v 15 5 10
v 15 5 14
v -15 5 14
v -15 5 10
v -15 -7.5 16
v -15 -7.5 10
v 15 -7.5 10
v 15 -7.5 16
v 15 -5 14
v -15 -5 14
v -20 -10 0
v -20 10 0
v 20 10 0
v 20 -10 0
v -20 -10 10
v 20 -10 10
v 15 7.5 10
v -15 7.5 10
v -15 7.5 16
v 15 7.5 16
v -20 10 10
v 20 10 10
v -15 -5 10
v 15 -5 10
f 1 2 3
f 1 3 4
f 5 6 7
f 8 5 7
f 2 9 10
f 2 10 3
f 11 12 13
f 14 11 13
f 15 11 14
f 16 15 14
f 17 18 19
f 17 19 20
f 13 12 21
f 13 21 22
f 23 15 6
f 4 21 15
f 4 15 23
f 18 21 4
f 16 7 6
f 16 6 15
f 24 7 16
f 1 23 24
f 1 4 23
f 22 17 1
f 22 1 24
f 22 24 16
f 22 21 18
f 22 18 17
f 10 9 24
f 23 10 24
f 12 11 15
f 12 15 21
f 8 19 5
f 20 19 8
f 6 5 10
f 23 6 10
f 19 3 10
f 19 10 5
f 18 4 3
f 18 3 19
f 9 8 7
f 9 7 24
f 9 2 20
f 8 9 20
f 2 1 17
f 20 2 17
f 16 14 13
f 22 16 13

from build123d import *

# Parameters (mm, degrees)
SKETCH_1_W          = 40
SKETCH_1_H          = 20
EXTRUDE_1_DEPTH     = 10
SKETCH_2_W          = 30
SKETCH_2_H          = 15
EXTRUDE_2_DEPTH     = 6
SKETCH_3_W          = 4
SKETCH_3_H          = 10
CUT_EXTRUDE_1_DEPTH = 40


with BuildPart() as part:
    # 草图1 → 凸台-拉伸1 (new body)
    with BuildSketch(Plane.XY):
        Rectangle(SKETCH_1_W, SKETCH_1_H)
    extrude(amount=EXTRUDE_1_DEPTH)

    # 草图2 → 凸台-拉伸2 (add)
    with BuildSketch(Plane.XY.offset(10)):
        Rectangle(SKETCH_2_W, SKETCH_2_H)
    extrude(amount=EXTRUDE_2_DEPTH)

    # 草图3 → 切除-拉伸1 (cut)
    with BuildSketch(Plane(origin=(15, 0, 0), x_dir=(0, 0, -1), z_dir=(1, 0, 0))):
        with Locations((-12, 0)):
            Rectangle(SKETCH_3_W, SKETCH_3_H)
    extrude(amount=-CUT_EXTRUDE_1_DEPTH, mode=Mode.SUBTRACT)


solid = part.part
